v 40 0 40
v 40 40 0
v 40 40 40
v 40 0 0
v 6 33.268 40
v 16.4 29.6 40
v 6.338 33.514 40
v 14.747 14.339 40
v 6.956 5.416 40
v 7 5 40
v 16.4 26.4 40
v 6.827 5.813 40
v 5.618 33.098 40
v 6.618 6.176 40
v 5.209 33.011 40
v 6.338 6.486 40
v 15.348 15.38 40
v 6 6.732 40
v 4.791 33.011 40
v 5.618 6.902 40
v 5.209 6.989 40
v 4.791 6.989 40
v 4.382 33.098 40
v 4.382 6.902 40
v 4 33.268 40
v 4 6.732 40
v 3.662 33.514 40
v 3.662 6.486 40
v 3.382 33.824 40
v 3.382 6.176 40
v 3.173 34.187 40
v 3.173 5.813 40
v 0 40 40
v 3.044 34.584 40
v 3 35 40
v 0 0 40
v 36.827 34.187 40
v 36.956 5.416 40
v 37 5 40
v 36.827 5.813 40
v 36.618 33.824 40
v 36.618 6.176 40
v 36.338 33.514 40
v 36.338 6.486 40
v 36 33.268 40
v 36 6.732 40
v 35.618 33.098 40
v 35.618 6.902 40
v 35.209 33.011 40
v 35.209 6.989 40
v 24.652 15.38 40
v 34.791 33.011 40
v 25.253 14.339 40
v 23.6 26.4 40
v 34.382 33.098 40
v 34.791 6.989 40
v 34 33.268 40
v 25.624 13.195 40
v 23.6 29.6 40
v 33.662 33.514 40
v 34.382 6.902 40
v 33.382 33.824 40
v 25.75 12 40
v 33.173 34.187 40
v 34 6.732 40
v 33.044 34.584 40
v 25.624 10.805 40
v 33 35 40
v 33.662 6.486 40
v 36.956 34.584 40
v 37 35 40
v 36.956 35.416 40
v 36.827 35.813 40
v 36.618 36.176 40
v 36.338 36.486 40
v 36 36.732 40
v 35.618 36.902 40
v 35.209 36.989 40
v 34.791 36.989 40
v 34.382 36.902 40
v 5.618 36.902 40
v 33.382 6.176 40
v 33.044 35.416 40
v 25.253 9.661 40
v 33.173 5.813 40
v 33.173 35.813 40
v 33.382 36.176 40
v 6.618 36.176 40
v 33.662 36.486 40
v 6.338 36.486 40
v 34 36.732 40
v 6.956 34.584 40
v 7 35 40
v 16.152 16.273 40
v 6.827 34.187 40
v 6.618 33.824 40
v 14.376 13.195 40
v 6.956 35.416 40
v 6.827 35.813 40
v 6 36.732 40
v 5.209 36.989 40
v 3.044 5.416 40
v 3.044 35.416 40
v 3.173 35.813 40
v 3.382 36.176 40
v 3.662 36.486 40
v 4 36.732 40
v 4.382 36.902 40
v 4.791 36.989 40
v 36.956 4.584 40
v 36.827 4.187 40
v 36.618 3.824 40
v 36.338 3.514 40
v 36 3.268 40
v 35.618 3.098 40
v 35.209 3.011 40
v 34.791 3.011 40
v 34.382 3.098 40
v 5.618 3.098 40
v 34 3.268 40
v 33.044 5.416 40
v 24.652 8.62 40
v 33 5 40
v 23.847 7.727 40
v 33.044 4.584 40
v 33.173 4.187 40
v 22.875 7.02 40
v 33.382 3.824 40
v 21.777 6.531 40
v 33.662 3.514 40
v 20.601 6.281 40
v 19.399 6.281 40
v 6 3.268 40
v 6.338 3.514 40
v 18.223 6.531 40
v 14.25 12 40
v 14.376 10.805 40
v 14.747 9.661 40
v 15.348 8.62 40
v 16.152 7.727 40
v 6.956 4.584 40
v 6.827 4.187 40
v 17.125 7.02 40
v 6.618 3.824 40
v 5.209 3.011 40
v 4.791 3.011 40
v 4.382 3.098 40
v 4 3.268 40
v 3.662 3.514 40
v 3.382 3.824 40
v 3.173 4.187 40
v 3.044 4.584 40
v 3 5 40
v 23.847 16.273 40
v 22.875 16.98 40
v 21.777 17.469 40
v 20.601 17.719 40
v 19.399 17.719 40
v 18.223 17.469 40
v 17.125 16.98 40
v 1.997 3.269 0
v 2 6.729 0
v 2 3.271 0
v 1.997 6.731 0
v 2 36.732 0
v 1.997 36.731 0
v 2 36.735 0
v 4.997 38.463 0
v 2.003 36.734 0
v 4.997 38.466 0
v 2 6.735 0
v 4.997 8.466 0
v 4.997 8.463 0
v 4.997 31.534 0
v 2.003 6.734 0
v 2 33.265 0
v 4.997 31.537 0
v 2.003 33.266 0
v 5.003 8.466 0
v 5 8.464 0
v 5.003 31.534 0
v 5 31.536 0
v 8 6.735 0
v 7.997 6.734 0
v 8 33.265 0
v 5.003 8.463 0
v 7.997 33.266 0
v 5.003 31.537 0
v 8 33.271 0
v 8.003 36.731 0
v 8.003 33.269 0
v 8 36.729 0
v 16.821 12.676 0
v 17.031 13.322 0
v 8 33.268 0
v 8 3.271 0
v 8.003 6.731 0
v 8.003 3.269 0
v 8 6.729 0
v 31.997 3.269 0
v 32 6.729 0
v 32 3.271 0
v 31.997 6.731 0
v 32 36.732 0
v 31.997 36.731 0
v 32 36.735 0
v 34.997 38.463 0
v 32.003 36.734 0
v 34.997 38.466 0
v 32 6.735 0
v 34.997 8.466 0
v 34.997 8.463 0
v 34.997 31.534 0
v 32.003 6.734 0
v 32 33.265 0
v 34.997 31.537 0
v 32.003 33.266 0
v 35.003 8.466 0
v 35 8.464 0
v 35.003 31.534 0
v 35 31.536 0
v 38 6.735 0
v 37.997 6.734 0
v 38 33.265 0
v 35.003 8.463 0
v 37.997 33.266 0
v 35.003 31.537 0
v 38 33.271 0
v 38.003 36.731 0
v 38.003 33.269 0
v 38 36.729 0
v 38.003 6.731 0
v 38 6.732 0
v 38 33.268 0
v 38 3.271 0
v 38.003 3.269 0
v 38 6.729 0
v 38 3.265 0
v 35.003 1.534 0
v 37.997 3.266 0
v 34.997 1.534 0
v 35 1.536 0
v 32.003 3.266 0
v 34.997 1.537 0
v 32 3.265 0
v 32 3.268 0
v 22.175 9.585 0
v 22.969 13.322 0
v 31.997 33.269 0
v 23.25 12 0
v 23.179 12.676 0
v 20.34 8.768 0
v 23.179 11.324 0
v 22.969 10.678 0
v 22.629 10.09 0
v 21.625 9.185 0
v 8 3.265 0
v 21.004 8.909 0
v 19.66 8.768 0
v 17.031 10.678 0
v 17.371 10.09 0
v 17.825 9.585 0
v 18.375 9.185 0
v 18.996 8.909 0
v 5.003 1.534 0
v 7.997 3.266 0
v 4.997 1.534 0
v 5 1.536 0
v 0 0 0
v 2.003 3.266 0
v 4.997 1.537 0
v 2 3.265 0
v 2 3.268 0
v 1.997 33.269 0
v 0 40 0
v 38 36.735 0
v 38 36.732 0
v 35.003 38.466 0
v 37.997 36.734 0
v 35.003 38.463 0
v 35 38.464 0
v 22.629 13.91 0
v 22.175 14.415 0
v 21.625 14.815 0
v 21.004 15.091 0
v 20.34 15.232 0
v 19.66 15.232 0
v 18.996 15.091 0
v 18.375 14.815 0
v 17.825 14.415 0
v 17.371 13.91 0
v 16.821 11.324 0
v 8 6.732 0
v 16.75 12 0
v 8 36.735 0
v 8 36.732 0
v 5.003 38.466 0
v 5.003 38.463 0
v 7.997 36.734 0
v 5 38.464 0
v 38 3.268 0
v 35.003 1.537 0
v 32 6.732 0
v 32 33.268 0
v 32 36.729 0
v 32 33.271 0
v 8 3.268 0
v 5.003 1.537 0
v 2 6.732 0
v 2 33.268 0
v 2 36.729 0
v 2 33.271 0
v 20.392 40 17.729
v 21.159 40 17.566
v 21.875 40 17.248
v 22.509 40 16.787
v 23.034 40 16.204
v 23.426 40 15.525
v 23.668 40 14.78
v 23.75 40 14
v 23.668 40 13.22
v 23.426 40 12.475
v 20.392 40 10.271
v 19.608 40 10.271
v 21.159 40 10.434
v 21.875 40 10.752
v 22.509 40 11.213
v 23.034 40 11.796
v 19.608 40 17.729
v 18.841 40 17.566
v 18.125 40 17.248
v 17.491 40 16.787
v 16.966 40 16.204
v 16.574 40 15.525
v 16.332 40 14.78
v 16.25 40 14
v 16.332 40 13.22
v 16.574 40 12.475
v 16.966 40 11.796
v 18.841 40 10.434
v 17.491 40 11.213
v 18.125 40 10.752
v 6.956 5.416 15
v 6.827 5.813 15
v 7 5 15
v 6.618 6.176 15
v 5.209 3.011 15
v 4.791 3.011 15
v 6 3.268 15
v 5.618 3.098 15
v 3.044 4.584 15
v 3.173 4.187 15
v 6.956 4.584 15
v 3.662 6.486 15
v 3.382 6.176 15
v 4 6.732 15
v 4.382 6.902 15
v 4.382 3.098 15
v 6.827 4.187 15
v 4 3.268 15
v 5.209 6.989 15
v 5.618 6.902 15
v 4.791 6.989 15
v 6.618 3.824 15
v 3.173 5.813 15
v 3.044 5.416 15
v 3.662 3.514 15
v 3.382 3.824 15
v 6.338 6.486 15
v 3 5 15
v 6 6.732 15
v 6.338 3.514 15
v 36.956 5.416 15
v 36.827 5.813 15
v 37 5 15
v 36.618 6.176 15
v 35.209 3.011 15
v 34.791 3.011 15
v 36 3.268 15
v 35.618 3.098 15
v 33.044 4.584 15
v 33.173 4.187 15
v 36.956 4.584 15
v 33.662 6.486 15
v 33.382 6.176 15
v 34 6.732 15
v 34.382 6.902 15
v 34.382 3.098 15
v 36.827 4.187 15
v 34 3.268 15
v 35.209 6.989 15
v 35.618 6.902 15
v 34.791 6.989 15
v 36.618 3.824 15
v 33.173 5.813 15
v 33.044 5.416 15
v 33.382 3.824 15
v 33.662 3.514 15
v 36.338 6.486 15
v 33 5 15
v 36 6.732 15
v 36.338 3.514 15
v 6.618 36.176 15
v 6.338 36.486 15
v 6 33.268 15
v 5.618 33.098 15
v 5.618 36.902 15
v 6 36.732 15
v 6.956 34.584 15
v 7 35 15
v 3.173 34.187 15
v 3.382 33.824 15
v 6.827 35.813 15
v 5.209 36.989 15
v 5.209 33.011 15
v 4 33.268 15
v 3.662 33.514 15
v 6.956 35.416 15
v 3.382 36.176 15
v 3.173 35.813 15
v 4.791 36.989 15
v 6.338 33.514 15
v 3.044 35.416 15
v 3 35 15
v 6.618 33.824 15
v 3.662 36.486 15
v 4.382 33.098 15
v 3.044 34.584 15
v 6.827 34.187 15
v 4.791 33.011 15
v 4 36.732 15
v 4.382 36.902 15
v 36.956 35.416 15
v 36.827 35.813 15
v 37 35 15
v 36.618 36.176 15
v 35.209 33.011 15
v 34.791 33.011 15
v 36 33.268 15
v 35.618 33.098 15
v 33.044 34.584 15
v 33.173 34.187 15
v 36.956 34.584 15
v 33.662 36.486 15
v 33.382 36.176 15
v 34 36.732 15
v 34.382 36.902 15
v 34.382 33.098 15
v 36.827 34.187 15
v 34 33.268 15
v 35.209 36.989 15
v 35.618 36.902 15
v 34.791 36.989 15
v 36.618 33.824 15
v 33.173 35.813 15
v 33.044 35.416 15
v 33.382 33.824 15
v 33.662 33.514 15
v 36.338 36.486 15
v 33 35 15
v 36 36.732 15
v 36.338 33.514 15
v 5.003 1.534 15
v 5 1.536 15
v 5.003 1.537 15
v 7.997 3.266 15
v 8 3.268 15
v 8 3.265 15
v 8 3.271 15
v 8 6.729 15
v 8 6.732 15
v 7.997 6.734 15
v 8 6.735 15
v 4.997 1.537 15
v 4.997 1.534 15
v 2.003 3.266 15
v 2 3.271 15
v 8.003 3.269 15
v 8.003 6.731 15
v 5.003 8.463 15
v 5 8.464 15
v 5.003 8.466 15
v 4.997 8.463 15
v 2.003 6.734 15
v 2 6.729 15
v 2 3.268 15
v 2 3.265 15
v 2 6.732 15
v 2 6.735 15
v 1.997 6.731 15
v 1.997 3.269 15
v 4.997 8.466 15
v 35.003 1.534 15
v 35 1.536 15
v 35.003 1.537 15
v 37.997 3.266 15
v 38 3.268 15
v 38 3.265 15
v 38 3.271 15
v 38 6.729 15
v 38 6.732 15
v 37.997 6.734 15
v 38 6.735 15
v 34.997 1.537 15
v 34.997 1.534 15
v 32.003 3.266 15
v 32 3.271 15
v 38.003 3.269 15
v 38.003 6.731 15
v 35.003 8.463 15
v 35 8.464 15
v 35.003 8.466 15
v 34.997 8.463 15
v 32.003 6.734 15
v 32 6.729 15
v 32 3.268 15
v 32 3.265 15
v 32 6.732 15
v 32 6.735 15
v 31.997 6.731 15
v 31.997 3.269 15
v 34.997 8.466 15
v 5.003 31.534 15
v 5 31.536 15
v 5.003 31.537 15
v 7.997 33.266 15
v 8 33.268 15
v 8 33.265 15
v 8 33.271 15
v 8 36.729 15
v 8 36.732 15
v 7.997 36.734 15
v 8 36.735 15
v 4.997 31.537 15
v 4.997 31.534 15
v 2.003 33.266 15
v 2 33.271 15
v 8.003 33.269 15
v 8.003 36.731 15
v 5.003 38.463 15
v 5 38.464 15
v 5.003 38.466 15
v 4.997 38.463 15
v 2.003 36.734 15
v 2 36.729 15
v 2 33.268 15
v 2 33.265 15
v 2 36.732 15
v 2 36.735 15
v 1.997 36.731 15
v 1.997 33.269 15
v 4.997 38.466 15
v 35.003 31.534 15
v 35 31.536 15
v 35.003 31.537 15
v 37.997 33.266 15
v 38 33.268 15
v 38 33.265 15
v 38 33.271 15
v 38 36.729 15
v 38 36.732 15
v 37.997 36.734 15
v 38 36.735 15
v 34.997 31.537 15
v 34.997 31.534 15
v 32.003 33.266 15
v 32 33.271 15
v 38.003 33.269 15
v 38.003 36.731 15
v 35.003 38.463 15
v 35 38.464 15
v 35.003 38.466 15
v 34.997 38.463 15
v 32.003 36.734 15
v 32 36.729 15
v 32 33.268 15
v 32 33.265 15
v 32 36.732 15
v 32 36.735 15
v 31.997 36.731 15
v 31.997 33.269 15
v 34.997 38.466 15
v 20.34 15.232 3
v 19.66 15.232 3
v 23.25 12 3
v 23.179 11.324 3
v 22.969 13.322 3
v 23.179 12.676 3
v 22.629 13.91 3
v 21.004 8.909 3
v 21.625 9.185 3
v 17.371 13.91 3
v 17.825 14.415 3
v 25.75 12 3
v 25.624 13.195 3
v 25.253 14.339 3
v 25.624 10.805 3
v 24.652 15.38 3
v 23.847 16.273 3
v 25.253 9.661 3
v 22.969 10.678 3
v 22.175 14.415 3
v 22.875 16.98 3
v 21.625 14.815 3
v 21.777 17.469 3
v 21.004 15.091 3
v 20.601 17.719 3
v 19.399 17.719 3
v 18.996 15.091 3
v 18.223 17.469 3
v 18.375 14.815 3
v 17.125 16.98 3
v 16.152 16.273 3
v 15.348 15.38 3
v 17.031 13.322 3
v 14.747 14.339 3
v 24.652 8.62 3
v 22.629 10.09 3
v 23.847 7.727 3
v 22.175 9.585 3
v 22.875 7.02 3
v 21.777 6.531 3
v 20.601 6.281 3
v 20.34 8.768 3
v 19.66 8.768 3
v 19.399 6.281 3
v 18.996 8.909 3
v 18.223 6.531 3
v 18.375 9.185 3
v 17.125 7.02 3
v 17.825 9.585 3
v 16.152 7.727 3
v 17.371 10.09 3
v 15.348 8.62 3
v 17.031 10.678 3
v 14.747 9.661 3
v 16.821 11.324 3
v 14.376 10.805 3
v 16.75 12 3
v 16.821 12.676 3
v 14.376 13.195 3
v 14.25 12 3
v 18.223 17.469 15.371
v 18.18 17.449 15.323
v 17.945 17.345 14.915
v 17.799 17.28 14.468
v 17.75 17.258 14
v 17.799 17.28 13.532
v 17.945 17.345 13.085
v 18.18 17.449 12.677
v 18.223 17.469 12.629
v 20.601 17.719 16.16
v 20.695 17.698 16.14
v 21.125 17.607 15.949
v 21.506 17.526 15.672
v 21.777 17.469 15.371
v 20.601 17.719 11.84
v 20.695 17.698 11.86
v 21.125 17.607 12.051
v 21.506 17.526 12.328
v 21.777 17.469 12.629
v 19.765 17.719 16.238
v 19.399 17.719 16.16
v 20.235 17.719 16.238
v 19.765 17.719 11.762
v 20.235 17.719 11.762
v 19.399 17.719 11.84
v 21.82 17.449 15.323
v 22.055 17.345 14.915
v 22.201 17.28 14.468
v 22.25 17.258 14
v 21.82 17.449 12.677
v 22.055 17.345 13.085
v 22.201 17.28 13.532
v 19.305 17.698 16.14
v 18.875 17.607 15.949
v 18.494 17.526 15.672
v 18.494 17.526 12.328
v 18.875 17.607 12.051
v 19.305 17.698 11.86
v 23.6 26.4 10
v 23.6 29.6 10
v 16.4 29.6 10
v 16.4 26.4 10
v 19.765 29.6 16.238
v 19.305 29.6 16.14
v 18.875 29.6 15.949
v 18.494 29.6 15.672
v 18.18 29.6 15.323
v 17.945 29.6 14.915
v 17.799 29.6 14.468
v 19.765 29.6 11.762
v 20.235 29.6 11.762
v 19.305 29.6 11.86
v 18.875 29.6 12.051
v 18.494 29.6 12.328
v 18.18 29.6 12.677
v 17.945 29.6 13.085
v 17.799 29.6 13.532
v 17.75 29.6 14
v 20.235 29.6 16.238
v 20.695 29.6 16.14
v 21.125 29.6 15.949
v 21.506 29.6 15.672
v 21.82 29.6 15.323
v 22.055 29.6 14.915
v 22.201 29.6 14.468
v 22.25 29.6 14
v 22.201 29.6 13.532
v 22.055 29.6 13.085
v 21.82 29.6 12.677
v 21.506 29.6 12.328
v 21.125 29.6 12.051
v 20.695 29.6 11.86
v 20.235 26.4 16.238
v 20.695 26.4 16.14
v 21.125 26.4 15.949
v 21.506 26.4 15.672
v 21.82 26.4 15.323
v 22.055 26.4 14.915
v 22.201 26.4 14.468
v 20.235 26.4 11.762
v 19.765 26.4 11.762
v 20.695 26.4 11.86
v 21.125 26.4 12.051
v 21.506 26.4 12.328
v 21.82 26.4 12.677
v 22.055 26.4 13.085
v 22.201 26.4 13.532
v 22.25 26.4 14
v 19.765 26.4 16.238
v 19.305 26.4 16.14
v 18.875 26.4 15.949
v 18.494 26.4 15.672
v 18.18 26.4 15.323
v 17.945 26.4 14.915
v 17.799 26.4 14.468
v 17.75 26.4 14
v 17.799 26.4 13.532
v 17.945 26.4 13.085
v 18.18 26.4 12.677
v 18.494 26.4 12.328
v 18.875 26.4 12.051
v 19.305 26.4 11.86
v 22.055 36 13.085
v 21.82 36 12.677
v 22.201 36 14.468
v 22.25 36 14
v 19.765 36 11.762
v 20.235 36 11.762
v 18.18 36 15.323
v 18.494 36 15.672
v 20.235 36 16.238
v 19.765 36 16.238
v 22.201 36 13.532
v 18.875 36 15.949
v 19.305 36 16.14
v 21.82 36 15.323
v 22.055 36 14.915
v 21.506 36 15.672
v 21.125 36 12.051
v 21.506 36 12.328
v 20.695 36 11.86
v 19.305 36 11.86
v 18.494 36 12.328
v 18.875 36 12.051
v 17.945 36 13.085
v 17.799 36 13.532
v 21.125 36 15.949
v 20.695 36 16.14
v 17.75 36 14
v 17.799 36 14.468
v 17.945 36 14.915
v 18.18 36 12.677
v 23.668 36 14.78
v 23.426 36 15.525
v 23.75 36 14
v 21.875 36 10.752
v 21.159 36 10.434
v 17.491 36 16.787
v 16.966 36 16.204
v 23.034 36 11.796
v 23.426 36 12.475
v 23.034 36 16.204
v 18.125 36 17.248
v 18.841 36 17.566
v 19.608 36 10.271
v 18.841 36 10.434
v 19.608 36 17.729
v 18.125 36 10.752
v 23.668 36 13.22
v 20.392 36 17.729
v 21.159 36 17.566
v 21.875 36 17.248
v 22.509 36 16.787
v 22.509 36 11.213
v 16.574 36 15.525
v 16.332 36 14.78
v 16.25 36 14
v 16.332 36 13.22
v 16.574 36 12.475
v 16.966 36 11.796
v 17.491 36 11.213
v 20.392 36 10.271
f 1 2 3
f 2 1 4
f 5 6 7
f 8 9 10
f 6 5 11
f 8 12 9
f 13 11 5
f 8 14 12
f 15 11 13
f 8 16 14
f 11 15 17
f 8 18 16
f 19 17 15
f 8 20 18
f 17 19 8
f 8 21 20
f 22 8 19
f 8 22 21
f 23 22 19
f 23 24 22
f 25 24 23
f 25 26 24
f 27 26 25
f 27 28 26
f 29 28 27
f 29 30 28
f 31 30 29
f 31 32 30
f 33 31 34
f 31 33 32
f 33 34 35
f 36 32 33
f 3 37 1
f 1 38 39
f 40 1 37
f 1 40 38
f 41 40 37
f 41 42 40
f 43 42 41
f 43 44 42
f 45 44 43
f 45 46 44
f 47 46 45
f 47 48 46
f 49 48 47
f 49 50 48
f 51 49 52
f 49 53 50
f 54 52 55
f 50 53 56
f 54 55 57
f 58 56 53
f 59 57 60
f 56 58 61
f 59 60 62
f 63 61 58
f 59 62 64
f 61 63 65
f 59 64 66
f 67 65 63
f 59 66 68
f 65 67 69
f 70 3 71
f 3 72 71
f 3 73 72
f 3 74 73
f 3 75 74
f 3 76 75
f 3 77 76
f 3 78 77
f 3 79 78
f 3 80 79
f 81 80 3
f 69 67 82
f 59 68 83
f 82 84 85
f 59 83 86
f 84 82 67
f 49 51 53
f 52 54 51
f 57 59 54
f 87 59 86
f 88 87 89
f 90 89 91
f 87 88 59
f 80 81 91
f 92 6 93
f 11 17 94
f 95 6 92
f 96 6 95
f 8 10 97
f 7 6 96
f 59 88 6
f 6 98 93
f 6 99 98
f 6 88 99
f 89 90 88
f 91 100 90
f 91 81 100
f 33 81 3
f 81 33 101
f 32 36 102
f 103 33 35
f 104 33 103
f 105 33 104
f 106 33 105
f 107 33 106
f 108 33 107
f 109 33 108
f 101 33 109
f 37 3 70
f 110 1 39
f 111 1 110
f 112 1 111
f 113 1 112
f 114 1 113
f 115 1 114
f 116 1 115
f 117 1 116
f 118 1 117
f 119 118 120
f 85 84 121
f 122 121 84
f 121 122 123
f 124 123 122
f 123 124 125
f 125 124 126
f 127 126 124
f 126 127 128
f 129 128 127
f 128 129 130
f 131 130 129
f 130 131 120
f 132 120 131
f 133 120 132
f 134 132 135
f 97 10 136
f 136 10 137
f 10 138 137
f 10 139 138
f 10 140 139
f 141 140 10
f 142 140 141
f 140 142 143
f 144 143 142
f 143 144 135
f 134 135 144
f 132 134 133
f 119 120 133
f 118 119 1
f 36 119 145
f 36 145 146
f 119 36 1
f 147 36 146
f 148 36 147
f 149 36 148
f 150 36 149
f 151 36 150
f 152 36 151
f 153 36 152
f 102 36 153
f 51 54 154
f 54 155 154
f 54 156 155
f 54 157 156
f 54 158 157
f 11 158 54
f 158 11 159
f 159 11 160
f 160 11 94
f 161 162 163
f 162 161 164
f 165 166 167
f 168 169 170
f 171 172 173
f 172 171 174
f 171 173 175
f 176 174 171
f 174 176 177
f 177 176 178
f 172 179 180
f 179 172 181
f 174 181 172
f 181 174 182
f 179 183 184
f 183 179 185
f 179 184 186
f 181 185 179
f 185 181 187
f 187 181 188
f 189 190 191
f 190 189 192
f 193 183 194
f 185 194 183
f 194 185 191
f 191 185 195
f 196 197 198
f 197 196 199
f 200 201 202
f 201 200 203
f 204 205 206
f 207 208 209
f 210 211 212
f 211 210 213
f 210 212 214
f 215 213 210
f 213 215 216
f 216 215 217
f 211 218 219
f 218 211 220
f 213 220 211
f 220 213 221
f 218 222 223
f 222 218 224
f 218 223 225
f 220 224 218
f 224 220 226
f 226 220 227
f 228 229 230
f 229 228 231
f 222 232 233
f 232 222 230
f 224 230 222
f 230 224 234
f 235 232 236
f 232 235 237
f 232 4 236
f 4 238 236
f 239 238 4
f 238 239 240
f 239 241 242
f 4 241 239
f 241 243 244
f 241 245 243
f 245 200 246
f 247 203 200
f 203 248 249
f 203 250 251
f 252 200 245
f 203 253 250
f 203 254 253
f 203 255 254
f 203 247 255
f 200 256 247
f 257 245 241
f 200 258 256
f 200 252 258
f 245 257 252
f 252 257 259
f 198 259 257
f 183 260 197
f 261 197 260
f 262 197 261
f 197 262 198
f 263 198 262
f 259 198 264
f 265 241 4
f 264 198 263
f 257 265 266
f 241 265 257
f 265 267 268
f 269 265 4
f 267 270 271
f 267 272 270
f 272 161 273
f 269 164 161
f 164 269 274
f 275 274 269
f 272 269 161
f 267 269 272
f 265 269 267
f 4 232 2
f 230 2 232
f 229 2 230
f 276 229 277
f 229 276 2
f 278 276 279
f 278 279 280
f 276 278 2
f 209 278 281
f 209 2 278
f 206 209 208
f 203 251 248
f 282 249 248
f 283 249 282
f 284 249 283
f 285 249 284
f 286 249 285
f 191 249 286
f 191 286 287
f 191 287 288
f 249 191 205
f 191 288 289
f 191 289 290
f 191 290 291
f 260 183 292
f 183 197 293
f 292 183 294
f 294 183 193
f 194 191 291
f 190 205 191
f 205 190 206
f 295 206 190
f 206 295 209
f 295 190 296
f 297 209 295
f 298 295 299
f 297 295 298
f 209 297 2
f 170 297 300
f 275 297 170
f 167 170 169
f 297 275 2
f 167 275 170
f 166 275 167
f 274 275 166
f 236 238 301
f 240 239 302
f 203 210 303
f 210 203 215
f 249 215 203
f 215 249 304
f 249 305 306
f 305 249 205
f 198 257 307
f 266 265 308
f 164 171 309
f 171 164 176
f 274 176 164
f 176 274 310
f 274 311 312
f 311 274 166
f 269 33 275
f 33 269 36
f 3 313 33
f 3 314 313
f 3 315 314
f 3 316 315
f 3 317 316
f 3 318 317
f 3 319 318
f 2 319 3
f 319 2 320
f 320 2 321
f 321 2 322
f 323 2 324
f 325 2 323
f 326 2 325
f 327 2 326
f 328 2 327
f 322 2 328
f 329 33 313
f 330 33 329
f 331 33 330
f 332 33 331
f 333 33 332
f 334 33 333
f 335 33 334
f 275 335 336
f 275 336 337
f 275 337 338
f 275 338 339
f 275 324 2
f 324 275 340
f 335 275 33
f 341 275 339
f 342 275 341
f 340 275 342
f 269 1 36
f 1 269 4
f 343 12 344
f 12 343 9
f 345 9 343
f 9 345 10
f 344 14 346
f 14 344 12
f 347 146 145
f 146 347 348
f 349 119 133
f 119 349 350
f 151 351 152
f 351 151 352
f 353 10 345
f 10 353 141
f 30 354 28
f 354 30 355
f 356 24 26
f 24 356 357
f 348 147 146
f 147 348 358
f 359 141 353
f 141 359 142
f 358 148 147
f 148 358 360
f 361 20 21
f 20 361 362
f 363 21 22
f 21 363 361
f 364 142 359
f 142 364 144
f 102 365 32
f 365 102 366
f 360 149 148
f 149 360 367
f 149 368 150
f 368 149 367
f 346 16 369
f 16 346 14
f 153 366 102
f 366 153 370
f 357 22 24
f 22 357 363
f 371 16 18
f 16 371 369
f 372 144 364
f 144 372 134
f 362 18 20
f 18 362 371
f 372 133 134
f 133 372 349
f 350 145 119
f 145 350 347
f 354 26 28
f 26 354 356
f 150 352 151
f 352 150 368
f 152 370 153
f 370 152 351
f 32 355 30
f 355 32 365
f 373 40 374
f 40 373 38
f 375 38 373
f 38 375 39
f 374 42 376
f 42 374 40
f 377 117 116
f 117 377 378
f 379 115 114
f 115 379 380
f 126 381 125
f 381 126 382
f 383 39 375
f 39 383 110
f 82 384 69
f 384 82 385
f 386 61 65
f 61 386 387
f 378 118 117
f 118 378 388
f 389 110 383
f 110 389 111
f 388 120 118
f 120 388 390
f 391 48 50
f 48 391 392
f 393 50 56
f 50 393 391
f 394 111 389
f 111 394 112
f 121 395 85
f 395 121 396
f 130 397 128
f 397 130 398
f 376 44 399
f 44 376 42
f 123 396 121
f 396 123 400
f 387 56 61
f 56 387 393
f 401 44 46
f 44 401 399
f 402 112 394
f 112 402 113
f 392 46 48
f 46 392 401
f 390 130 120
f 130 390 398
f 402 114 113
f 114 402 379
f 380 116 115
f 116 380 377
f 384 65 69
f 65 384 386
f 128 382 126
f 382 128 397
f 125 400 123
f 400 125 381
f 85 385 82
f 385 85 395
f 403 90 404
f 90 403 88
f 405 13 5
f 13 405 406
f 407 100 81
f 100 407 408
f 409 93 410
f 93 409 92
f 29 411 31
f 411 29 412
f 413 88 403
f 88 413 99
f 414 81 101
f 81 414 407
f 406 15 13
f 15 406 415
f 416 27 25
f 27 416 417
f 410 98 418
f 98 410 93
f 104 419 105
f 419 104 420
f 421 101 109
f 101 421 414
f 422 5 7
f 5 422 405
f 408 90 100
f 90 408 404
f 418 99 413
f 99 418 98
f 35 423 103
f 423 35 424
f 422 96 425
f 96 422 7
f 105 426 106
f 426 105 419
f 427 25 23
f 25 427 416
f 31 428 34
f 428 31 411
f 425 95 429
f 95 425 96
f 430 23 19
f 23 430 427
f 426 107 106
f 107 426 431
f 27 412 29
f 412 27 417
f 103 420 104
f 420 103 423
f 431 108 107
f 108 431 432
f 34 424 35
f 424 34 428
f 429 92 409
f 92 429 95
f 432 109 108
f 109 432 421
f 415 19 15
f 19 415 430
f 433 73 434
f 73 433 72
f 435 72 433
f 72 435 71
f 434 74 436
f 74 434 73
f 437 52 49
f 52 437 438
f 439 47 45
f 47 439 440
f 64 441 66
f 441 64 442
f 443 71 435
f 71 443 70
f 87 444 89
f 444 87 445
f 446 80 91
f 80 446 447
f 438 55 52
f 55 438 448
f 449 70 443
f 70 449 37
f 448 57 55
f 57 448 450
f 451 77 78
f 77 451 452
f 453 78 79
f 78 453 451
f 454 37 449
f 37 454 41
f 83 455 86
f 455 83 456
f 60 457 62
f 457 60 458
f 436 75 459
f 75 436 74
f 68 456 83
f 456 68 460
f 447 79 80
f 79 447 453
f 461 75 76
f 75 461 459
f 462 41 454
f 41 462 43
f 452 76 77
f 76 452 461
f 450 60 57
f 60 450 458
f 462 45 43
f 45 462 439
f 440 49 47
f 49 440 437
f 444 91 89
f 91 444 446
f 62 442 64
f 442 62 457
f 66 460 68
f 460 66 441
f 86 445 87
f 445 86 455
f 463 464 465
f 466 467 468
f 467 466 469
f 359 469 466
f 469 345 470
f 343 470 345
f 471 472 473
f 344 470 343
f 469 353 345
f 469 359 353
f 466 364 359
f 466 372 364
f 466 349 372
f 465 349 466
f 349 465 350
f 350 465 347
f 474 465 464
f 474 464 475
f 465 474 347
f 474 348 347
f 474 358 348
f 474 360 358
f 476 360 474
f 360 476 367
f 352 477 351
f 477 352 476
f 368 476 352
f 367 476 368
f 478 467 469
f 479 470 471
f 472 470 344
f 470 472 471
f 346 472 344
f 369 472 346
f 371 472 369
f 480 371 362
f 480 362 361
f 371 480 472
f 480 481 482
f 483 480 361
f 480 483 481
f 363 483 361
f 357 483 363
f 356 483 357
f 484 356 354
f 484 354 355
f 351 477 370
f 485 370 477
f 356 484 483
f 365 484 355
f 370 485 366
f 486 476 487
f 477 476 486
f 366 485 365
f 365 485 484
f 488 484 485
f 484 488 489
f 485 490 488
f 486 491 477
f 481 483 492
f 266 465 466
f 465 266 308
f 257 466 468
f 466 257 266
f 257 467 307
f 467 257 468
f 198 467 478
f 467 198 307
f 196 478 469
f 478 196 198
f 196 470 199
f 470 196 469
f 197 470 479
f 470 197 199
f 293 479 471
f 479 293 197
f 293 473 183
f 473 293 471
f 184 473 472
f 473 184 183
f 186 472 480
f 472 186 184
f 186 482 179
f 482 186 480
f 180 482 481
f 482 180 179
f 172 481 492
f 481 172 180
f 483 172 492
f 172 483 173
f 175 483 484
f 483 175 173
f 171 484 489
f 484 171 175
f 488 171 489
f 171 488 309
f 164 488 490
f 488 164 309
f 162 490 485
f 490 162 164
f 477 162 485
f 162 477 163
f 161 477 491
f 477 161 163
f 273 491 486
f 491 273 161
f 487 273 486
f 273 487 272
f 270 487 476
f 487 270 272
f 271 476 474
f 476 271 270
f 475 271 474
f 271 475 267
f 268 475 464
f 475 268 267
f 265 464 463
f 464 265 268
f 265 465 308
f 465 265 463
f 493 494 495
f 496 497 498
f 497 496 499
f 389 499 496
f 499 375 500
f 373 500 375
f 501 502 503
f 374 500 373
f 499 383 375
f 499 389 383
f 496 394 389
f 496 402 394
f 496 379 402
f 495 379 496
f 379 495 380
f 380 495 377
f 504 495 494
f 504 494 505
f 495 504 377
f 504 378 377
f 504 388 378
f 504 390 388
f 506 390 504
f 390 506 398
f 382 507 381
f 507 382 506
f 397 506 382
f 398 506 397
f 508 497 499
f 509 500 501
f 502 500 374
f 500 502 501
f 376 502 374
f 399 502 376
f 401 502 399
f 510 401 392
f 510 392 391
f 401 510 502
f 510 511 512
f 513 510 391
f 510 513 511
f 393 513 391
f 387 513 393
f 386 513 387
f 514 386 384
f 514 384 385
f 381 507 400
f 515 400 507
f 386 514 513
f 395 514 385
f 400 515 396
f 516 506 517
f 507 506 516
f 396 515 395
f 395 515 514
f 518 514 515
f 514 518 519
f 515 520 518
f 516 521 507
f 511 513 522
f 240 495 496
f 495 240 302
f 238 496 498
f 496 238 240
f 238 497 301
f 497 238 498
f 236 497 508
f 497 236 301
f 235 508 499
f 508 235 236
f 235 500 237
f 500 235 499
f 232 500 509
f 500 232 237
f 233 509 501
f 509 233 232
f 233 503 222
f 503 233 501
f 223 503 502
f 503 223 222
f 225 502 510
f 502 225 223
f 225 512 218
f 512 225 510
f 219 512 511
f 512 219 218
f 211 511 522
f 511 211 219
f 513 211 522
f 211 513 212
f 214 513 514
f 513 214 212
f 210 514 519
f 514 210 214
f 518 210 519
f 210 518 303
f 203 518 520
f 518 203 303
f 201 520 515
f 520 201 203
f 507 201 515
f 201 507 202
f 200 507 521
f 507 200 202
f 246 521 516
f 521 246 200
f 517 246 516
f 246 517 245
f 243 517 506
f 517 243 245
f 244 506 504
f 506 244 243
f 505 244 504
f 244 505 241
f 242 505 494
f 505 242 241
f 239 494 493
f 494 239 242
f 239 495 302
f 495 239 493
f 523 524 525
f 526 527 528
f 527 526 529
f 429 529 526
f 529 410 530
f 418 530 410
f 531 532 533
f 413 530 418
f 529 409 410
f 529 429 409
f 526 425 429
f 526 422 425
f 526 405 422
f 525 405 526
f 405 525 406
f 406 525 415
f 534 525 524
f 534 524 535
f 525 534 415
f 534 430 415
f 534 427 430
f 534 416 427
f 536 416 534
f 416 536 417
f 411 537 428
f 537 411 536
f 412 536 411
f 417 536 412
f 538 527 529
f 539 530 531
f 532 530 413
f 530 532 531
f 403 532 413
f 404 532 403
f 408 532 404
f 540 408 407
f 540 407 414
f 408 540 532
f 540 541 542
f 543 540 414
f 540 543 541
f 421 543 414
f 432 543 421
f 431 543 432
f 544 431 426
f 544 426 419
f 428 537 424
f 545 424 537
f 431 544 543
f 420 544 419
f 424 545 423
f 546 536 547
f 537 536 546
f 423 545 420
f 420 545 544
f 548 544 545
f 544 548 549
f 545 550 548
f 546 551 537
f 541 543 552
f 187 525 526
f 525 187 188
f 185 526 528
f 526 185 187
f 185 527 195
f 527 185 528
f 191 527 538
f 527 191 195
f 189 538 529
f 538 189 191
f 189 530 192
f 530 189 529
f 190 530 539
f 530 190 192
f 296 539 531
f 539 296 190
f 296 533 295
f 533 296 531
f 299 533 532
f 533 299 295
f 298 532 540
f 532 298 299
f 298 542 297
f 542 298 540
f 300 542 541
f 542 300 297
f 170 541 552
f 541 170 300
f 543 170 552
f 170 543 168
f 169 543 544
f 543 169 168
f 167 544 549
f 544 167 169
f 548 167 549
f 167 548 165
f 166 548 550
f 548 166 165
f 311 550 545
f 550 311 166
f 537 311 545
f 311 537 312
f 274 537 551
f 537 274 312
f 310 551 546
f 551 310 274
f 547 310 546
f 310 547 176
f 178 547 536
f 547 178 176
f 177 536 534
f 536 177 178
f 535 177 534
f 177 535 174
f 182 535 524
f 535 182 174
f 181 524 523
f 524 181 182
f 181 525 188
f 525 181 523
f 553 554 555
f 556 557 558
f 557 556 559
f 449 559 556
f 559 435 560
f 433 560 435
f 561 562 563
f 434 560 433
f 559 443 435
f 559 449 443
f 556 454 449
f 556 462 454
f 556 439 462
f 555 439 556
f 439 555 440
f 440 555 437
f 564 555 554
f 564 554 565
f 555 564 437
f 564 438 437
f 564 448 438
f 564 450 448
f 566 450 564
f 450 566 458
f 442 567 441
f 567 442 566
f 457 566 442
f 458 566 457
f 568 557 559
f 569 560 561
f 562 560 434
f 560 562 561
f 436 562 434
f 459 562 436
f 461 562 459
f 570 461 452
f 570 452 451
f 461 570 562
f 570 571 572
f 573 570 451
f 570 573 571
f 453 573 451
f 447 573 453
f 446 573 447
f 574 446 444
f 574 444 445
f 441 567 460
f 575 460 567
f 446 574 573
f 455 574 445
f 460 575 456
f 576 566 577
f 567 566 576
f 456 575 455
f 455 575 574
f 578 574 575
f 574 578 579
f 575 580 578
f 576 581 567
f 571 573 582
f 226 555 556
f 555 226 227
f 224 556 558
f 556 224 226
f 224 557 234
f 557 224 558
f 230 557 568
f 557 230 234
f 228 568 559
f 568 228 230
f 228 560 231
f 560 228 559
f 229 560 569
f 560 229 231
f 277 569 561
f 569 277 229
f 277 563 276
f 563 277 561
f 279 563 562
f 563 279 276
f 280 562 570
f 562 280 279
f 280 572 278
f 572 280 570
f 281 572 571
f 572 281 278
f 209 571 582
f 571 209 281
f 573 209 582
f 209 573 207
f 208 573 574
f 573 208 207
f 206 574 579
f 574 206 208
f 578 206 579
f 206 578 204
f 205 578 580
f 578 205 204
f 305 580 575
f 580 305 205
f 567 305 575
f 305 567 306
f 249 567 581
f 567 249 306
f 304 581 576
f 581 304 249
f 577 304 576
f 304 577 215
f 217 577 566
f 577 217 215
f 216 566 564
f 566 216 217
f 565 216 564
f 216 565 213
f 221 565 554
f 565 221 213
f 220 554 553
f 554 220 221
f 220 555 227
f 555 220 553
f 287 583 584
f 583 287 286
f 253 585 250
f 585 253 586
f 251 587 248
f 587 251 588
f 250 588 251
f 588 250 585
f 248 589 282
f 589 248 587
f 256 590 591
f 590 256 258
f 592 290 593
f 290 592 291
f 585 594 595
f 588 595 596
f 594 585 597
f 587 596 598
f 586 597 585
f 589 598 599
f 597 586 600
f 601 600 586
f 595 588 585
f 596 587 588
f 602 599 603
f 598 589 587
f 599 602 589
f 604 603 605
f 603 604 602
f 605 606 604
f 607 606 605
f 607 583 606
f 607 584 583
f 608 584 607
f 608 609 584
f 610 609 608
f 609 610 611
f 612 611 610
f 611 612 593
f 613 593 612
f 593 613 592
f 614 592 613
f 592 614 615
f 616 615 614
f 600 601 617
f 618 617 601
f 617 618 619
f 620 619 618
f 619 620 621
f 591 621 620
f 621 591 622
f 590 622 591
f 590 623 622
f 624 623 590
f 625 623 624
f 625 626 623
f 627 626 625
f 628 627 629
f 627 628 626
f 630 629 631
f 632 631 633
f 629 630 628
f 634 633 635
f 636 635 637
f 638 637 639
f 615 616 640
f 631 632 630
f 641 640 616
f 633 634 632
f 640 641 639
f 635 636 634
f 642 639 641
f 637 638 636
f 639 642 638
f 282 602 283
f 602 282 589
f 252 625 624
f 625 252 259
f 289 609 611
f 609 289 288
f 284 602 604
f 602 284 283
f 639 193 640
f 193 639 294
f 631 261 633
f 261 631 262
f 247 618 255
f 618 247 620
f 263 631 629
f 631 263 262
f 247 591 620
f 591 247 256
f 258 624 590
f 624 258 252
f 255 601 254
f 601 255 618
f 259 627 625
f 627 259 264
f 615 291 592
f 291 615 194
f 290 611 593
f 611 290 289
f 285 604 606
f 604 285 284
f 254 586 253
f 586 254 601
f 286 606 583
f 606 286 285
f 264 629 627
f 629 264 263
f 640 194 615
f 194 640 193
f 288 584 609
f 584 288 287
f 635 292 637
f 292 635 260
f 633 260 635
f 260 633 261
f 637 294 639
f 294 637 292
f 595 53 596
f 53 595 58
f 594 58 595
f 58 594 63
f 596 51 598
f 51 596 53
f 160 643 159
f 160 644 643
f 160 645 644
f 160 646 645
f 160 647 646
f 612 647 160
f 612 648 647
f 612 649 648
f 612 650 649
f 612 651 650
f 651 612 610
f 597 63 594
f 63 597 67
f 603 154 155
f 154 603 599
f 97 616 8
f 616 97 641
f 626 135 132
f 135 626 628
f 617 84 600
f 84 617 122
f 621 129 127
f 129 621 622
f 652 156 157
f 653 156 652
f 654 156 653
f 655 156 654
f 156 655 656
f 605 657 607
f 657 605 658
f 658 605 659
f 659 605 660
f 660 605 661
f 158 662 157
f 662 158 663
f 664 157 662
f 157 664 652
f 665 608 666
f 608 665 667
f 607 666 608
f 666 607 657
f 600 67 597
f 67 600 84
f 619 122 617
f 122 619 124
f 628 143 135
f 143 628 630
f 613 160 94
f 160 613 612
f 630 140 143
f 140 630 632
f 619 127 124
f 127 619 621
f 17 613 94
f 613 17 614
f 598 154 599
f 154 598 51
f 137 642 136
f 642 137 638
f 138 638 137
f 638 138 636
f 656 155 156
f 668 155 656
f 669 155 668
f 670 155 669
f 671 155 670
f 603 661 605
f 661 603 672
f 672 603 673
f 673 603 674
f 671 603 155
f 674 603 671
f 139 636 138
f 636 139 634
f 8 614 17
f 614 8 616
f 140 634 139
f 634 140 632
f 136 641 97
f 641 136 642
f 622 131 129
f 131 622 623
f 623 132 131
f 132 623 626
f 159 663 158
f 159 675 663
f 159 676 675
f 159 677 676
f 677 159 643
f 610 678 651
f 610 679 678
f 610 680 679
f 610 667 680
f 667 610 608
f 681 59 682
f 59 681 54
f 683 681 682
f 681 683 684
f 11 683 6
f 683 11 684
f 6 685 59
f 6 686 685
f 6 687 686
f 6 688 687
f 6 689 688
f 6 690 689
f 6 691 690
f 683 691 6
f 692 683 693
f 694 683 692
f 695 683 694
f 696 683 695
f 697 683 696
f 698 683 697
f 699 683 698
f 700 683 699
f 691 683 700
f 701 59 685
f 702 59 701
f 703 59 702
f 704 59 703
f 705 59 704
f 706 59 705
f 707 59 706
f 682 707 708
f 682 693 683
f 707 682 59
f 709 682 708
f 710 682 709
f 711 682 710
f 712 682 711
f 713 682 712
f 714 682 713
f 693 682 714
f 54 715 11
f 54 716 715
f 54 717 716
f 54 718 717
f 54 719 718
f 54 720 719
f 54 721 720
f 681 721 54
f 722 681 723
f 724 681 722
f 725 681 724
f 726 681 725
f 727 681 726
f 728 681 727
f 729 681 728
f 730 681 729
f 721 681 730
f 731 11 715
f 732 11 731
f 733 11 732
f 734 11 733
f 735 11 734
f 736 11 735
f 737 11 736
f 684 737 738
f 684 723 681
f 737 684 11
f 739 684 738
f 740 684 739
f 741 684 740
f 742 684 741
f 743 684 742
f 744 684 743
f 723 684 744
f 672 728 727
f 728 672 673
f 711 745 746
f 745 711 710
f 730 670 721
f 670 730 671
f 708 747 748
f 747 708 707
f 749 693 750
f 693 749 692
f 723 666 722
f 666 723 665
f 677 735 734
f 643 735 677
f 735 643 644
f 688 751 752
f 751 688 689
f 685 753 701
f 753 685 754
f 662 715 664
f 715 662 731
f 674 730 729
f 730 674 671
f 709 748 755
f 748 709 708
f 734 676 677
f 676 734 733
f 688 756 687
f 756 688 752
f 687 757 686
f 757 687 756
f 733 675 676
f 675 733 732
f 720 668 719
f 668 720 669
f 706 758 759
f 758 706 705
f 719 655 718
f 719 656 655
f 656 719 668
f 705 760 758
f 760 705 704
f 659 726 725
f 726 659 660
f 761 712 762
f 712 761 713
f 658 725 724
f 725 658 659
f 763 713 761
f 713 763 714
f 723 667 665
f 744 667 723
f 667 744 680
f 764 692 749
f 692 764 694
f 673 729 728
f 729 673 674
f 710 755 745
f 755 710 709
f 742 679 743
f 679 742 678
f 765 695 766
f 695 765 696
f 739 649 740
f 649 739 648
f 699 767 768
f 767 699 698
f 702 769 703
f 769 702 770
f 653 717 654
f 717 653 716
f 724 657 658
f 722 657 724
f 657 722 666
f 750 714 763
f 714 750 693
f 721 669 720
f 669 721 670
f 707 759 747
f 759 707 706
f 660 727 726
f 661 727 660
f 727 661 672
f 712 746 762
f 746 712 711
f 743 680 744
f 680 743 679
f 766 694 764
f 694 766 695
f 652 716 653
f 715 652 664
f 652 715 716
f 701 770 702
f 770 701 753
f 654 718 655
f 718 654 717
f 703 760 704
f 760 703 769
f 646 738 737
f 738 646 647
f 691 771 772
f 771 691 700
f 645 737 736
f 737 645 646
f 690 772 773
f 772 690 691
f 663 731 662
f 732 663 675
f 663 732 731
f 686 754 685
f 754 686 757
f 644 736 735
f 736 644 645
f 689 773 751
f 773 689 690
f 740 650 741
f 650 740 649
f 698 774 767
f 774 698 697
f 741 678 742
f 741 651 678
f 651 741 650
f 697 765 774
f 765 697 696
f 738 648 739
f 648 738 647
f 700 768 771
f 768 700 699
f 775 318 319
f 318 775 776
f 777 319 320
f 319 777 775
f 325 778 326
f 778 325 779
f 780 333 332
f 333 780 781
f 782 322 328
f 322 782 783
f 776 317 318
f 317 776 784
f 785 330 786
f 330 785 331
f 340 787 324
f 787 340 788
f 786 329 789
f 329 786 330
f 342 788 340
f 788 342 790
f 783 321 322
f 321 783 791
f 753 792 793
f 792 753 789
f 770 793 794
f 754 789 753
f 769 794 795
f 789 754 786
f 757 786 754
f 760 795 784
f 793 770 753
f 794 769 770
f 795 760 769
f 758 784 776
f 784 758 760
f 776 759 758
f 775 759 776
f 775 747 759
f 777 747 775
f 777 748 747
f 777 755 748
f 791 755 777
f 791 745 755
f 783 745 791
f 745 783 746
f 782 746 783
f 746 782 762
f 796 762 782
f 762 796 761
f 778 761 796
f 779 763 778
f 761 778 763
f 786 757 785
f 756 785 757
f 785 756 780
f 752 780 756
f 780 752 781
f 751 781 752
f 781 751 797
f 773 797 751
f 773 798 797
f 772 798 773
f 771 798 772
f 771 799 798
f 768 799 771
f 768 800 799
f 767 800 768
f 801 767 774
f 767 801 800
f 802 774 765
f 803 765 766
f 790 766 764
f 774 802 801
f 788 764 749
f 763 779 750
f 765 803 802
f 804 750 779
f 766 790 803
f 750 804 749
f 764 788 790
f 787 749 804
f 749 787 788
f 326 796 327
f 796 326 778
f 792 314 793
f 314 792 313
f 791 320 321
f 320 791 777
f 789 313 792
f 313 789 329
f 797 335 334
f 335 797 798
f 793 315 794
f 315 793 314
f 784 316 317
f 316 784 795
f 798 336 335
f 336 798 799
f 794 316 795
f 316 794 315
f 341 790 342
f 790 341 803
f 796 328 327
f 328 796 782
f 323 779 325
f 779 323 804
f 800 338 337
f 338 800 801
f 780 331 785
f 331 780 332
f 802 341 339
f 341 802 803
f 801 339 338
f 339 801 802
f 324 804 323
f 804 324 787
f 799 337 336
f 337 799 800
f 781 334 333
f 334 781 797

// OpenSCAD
$fn=30;
l_p=6;
b_p=3.47;



module printhead_body () {
    
//translate([0,40,40])rotate([180,0,0])
    difference(){
    cube(40);
    translate([5,5,0])cylinder(40,2,2);
    translate([35,5,0])cylinder(40,2,2);
    translate([5,35,0])cylinder(40,2,2);
    translate([35,35,0])cylinder(40,2,2);

    translate([5,5,0]){
    mutterextrusion(15);
    }
    
    translate([35,5,0]){
    mutterextrusion(15);
    }
    
    translate([5,35,0]){
    mutterextrusion(15);
    }
    
    translate([35,35,0]){
    mutterextrusion(15);
    }
    translate([20,12,0]) cylinder(3,d=6.5);
    translate([20,12,3]) cylinder(37, d=11.5);
    translate([20,28,25]) cube([7.2,3.2,30], center=true);
    translate([20,40,14]) rotate([90,0,0]) cylinder(25,d=4.5);
    translate([20,40,14]) rotate([90,0,0]) cylinder(4,d=7.5);
}
}

module mutterextrusion (laenge) {
    linear_extrude(laenge)union(){
    polygon([[0,0],[l_p/2,b_p/2],[l_p/2,-b_p/2]],[[0,1,2]]);
    rotate([0,0,60])polygon([[0,0],[l_p/2,b_p/2],[l_p/2,-b_p/2]],[[0,1,2]]);
    rotate([0,0,120])polygon([[0,0],[l_p/2,b_p/2],[l_p/2,-b_p/2]],[[0,1,2]]);
    rotate([0,0,180])polygon([[0,0],[l_p/2,b_p/2],[l_p/2,-b_p/2]],[[0,1,2]]);
    rotate([0,0,240])polygon([[0,0],[l_p/2,b_p/2],[l_p/2,-b_p/2]],[[0,1,2]]);
    rotate([0,0,300])polygon([[0,0],[l_p/2,b_p/2],[l_p/2,-b_p/2]],[[0,1,2]]);
    };
}

printhead_body ();
